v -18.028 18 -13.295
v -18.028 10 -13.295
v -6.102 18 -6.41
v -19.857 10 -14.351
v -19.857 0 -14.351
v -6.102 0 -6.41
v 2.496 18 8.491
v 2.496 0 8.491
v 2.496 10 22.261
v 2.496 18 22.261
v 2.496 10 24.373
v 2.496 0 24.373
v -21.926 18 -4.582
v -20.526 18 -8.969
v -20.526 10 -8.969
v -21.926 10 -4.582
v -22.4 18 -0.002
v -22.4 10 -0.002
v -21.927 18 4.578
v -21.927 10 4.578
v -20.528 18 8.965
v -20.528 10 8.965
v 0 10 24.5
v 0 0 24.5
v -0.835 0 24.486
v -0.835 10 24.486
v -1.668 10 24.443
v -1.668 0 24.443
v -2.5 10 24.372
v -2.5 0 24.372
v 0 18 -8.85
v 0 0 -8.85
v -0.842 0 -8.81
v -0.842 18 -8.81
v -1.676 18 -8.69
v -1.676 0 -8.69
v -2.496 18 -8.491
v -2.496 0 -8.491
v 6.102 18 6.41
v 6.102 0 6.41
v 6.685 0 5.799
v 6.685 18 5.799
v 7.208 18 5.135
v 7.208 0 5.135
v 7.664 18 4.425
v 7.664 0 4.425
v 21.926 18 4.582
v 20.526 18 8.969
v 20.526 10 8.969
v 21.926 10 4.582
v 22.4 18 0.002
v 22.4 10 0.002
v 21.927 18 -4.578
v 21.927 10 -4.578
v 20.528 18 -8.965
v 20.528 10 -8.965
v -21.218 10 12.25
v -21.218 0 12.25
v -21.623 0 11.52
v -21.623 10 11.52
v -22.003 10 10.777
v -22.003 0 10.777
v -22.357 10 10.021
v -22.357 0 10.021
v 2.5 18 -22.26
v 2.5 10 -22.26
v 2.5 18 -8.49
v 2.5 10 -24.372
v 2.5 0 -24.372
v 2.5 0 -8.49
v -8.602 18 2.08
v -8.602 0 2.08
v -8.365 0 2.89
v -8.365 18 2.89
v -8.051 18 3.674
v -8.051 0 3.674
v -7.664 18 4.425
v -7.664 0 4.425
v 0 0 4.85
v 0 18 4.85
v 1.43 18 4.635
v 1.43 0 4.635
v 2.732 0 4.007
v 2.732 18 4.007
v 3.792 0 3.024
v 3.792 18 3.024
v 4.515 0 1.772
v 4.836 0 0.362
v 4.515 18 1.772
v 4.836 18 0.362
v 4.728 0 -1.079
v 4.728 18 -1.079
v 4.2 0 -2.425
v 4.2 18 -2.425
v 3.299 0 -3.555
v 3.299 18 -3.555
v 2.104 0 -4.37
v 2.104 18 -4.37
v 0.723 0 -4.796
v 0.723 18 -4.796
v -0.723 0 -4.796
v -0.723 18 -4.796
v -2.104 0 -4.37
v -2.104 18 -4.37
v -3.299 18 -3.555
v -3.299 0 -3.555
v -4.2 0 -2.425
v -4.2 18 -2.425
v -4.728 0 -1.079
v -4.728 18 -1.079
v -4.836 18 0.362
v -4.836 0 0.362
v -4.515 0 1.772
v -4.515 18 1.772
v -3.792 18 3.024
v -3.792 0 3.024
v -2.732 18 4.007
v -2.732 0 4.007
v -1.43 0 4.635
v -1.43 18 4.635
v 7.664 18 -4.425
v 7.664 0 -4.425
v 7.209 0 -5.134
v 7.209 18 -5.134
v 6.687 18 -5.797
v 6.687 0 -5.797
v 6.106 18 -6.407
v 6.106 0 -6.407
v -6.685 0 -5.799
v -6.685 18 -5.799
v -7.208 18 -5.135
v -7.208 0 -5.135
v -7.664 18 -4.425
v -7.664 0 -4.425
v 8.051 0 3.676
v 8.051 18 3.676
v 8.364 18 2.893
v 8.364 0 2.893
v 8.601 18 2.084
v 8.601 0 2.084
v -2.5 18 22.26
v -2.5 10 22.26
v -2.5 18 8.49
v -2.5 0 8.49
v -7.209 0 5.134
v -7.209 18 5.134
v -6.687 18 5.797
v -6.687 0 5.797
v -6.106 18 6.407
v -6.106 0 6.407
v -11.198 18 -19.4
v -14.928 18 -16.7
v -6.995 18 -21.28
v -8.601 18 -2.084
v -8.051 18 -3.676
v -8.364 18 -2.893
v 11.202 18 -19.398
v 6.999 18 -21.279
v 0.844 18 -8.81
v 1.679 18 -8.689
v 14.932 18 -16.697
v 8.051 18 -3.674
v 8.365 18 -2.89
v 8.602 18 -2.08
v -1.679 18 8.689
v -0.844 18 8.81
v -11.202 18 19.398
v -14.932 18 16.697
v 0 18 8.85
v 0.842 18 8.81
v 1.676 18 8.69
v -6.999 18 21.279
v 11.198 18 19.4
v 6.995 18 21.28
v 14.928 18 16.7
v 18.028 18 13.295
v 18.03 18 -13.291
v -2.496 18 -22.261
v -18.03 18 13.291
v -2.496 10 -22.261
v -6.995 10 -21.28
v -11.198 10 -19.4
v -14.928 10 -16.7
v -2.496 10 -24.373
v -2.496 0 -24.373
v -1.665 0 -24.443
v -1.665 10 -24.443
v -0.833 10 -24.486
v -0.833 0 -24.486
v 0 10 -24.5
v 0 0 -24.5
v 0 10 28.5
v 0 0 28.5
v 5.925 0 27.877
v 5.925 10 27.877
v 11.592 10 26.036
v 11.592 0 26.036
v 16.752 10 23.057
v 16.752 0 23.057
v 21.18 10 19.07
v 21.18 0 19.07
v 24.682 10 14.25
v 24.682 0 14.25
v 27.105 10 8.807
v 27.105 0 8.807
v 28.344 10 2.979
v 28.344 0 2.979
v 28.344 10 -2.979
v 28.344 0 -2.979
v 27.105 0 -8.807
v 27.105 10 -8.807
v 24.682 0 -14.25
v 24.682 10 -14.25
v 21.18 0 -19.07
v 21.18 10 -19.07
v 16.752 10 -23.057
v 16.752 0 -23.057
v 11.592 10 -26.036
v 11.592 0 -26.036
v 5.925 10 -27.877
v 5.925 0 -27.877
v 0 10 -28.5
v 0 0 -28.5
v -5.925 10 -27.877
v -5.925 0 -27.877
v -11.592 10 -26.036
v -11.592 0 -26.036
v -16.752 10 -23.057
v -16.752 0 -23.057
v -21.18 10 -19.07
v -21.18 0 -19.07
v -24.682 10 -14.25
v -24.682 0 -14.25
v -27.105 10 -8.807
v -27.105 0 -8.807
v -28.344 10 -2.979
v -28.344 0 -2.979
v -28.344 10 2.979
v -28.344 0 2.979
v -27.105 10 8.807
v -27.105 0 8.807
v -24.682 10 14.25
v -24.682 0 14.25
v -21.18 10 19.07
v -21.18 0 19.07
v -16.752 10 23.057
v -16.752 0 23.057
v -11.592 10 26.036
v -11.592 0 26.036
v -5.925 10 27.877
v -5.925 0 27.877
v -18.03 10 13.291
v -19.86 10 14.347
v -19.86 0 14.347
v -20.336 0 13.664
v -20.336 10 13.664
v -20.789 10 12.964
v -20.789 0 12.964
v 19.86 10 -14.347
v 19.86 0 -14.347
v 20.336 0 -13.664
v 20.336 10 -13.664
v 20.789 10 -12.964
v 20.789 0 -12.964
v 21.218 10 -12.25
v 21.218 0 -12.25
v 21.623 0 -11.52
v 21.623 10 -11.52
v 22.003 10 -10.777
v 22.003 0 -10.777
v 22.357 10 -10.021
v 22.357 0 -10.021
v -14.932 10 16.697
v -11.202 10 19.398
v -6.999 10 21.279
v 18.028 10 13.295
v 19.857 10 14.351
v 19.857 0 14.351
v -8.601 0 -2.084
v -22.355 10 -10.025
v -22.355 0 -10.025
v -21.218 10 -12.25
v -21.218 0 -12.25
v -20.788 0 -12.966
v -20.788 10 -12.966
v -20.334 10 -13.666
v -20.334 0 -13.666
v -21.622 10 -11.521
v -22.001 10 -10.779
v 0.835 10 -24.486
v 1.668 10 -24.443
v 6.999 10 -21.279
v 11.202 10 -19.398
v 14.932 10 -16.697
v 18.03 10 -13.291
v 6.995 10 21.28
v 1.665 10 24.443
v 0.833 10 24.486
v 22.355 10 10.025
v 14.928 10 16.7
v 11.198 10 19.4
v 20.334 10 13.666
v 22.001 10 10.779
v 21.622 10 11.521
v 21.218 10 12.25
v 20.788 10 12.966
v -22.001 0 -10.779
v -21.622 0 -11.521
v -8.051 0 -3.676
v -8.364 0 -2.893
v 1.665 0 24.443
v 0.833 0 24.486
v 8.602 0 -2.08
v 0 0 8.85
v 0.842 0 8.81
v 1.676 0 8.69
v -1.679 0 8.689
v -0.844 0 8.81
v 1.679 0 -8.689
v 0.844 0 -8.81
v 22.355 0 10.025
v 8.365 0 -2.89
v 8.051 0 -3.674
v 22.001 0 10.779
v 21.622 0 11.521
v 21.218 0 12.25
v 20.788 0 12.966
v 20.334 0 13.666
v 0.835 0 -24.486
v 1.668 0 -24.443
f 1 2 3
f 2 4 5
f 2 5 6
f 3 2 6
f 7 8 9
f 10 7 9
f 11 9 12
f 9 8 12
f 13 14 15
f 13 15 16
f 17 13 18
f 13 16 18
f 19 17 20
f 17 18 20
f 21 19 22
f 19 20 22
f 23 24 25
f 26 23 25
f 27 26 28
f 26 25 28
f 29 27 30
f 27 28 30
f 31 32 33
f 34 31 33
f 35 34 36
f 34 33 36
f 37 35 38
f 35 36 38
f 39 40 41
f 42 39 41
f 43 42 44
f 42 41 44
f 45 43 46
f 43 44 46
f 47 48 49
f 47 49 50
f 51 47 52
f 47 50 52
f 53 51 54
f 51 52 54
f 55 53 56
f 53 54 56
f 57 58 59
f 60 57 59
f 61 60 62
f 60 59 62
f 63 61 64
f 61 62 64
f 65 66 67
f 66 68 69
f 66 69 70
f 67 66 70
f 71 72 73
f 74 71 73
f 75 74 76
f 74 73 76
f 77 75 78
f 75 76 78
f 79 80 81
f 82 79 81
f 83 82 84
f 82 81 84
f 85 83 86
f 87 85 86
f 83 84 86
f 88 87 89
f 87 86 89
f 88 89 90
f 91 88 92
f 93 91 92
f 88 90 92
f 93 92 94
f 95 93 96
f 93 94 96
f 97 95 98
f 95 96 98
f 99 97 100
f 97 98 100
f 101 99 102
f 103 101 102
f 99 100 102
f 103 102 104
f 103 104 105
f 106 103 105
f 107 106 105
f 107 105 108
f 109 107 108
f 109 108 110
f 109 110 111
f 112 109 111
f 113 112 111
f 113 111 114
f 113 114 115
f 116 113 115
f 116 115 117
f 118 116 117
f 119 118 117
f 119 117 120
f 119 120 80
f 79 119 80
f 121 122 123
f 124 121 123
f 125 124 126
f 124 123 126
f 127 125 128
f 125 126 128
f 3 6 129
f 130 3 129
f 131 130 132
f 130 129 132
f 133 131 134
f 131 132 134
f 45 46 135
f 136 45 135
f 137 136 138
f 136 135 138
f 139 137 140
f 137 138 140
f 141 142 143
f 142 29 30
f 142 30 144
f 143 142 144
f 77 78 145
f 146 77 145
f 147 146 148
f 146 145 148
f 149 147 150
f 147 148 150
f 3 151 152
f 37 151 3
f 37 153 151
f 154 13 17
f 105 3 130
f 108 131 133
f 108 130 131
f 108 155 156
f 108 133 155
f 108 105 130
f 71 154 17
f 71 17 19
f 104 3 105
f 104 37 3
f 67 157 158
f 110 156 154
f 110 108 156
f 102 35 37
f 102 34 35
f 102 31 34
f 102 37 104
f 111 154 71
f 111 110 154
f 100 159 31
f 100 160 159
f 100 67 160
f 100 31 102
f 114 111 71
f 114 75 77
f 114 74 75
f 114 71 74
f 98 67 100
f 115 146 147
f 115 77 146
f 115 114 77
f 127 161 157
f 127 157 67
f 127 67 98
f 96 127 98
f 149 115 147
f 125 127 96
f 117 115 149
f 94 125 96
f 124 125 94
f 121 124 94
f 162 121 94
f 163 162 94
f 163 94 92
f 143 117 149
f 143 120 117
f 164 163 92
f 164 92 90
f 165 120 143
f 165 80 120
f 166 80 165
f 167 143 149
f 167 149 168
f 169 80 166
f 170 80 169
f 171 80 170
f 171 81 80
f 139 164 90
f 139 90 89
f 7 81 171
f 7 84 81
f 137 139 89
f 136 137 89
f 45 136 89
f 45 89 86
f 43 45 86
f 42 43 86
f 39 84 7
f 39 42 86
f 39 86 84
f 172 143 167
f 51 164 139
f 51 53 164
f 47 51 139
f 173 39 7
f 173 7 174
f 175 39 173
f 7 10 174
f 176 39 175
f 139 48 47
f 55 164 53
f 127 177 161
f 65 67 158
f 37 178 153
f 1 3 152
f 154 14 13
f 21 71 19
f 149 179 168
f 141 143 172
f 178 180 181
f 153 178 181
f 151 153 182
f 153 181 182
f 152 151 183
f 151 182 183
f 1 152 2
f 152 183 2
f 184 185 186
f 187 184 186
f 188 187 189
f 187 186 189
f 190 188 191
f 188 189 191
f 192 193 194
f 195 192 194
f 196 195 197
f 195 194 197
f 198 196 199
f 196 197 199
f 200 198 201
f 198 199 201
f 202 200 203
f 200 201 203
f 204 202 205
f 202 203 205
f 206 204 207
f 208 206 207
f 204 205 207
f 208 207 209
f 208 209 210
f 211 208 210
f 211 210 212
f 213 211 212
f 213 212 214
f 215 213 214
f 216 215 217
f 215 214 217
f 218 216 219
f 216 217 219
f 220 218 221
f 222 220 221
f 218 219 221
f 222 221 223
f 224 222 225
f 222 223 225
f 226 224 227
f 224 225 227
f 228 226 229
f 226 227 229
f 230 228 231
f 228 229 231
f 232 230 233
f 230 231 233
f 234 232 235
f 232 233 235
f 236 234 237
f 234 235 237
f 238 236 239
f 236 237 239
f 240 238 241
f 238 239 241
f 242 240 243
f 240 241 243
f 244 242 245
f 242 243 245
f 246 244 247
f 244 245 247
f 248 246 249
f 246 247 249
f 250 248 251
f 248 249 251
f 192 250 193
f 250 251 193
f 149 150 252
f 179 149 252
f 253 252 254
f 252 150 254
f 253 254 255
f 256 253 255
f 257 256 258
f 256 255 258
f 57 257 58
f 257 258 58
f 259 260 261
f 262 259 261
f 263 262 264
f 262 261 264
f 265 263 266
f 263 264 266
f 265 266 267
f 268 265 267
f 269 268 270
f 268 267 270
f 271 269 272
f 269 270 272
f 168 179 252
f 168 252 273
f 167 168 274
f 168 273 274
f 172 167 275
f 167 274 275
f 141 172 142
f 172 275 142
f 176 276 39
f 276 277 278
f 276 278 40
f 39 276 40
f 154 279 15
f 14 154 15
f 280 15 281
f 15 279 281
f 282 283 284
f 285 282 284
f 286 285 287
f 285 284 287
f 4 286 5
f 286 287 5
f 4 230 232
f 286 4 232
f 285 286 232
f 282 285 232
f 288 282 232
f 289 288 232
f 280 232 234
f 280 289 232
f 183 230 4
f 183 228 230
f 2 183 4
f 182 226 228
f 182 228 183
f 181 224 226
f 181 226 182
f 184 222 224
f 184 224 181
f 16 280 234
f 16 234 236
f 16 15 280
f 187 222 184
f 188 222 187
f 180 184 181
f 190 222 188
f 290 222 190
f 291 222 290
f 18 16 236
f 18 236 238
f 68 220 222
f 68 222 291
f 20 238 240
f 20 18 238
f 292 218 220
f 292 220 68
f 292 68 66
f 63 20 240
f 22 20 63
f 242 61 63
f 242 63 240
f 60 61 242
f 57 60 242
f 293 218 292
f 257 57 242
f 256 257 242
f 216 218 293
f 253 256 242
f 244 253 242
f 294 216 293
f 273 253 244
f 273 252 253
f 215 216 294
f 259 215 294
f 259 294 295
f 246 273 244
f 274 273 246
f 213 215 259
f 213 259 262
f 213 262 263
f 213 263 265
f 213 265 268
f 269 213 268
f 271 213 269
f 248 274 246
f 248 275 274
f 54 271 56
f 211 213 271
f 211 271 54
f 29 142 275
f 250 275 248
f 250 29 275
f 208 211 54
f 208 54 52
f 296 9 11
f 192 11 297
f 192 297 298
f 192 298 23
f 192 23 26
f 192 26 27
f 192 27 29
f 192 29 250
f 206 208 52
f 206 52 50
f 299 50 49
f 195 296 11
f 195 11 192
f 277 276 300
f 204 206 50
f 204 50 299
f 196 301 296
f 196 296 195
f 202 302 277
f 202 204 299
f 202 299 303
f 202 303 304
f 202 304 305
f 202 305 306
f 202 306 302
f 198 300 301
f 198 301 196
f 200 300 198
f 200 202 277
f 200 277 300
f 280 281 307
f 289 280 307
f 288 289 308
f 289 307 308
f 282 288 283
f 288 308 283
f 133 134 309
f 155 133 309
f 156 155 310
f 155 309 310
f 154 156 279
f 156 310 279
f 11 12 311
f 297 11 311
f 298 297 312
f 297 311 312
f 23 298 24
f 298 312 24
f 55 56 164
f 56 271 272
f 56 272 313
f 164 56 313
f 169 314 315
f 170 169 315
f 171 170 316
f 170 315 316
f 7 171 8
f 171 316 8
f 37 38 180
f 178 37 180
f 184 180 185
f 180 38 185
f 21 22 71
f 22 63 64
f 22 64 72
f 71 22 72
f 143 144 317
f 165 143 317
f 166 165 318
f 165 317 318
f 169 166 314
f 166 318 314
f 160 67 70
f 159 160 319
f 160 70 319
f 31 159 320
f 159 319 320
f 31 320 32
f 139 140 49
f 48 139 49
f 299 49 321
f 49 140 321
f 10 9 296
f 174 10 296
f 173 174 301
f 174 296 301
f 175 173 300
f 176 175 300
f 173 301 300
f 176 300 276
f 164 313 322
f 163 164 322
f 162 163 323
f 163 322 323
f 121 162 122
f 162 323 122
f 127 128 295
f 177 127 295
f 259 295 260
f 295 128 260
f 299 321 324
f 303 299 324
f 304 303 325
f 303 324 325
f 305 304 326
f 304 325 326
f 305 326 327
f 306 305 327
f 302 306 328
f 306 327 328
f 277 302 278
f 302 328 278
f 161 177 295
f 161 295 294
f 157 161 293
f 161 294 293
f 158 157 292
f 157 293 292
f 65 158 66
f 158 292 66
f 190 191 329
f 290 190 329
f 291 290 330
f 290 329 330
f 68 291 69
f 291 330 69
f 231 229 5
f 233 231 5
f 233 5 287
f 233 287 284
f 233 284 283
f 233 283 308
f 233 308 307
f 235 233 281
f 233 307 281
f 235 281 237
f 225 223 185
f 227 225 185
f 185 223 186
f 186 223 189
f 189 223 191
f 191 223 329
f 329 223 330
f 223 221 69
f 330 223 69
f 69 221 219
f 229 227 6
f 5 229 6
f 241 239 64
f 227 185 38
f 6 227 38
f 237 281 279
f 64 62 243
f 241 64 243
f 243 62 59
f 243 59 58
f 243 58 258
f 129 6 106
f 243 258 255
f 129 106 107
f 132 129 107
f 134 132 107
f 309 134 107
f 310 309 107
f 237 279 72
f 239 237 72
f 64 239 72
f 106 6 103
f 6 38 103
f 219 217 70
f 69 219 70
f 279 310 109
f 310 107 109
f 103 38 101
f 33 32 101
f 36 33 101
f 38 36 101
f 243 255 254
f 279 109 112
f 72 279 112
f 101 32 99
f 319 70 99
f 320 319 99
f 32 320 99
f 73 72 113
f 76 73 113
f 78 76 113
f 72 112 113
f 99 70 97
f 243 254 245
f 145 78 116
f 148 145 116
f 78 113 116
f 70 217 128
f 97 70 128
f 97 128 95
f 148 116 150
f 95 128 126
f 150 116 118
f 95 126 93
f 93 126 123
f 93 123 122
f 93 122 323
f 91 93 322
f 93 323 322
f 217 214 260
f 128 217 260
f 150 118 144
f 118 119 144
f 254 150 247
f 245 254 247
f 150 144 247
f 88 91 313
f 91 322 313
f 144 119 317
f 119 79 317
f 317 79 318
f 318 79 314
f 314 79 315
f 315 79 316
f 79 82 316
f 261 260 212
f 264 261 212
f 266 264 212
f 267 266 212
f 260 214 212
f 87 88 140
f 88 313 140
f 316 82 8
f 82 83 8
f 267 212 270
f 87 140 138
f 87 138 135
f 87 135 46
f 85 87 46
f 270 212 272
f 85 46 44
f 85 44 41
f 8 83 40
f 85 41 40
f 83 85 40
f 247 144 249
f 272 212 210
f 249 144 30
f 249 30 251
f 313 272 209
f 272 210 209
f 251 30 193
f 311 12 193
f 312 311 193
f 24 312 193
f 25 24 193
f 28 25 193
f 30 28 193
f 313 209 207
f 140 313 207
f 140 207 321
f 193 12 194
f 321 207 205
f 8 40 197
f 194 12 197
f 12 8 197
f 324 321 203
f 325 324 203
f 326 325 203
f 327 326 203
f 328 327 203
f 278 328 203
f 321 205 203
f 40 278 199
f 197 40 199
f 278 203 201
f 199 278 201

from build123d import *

# Parameters (mm, degrees)
SKETCH1_R           = 28.5
BOSS_EXTRUDE1_DEPTH = 10
SKETCH2_R           = 22.4
BOSS_EXTRUDE2_DEPTH = 8
SKETCH3_R           = 4.85
CUT_EXTRUDE1_DEPTH  = 45.141816909
CUT_EXTRUDE2_DEPTH  = 45.141816909
CIRPATTERN1_COUNT   = 6


with BuildPart() as part:
    # Sketch1 → Boss-Extrude1 (new body)
    with BuildSketch(Plane(origin=(0, 0, 0), x_dir=(1, 0, 0), z_dir=(0, 1, 0))):
        with Locations(Location((0, 0, 0), (0, 0, 270))):
            Circle(SKETCH1_R)
    extrude(amount=BOSS_EXTRUDE1_DEPTH)

    # Sketch2 → Boss-Extrude2 (add)
    with BuildSketch(Plane(origin=(0, 10, 0), x_dir=(1, 0, 0), z_dir=(0, 1, 0))):
        with Locations(Location((0, 0, 0), (0, 0, 270))):
            Circle(SKETCH2_R)
    extrude(amount=BOSS_EXTRUDE2_DEPTH)

    # Sketch3 → Cut-Extrude1 (cut, through all)
    with BuildSketch(Plane(origin=(0, 18, 0), x_dir=(1, 0, 0), z_dir=(0, 1, 0))):
        with Locations(Location((0, 0, 0), (0, 0, 270))):
            Circle(SKETCH3_R)
    extrude(amount=-CUT_EXTRUDE1_DEPTH, mode=Mode.SUBTRACT)

    # Sketch9 → Cut-Extrude2 (cut, through all)
    with BuildSketch(Plane.XZ):
        with BuildLine():
            Line((0, 24.5), (0, 8.85))
            ThreePointArc((0, 8.85), (1.260616548, 8.759757184), (2.495524262, 8.490869134))
            Line((2.495524262, 8.490869134), (2.495524262, 24.372573903))
            ThreePointArc((2.495524262, 24.372573903), (1.249387725, 24.468122738), (0, 24.5))
        make_face()
        with BuildLine():
            ThreePointArc((-2.5, 8.489552403), (-1.26292542, 8.759424603), (0, 8.85))
            Line((0, 8.85), (0, 24.5))
            ThreePointArc((0, 24.5), (-1.251634383, 24.468007916), (-2.5, 24.372115214))
            Line((-2.5, 24.372115214), (-2.5, 8.489552403))
        make_face()
    cut_extrude2 = extrude(amount=-CUT_EXTRUDE2_DEPTH, mode=Mode.SUBTRACT)

    # CirPattern1: Cut-Extrude2 ×6 about axis
    cirpattern1_axis = Axis((0, 0, 0), (0, 1, 0))
    for i in range(1, CIRPATTERN1_COUNT):
        add(cut_extrude2.rotate(cirpattern1_axis, i * 360 / CIRPATTERN1_COUNT), mode=Mode.SUBTRACT)


solid = part.part
